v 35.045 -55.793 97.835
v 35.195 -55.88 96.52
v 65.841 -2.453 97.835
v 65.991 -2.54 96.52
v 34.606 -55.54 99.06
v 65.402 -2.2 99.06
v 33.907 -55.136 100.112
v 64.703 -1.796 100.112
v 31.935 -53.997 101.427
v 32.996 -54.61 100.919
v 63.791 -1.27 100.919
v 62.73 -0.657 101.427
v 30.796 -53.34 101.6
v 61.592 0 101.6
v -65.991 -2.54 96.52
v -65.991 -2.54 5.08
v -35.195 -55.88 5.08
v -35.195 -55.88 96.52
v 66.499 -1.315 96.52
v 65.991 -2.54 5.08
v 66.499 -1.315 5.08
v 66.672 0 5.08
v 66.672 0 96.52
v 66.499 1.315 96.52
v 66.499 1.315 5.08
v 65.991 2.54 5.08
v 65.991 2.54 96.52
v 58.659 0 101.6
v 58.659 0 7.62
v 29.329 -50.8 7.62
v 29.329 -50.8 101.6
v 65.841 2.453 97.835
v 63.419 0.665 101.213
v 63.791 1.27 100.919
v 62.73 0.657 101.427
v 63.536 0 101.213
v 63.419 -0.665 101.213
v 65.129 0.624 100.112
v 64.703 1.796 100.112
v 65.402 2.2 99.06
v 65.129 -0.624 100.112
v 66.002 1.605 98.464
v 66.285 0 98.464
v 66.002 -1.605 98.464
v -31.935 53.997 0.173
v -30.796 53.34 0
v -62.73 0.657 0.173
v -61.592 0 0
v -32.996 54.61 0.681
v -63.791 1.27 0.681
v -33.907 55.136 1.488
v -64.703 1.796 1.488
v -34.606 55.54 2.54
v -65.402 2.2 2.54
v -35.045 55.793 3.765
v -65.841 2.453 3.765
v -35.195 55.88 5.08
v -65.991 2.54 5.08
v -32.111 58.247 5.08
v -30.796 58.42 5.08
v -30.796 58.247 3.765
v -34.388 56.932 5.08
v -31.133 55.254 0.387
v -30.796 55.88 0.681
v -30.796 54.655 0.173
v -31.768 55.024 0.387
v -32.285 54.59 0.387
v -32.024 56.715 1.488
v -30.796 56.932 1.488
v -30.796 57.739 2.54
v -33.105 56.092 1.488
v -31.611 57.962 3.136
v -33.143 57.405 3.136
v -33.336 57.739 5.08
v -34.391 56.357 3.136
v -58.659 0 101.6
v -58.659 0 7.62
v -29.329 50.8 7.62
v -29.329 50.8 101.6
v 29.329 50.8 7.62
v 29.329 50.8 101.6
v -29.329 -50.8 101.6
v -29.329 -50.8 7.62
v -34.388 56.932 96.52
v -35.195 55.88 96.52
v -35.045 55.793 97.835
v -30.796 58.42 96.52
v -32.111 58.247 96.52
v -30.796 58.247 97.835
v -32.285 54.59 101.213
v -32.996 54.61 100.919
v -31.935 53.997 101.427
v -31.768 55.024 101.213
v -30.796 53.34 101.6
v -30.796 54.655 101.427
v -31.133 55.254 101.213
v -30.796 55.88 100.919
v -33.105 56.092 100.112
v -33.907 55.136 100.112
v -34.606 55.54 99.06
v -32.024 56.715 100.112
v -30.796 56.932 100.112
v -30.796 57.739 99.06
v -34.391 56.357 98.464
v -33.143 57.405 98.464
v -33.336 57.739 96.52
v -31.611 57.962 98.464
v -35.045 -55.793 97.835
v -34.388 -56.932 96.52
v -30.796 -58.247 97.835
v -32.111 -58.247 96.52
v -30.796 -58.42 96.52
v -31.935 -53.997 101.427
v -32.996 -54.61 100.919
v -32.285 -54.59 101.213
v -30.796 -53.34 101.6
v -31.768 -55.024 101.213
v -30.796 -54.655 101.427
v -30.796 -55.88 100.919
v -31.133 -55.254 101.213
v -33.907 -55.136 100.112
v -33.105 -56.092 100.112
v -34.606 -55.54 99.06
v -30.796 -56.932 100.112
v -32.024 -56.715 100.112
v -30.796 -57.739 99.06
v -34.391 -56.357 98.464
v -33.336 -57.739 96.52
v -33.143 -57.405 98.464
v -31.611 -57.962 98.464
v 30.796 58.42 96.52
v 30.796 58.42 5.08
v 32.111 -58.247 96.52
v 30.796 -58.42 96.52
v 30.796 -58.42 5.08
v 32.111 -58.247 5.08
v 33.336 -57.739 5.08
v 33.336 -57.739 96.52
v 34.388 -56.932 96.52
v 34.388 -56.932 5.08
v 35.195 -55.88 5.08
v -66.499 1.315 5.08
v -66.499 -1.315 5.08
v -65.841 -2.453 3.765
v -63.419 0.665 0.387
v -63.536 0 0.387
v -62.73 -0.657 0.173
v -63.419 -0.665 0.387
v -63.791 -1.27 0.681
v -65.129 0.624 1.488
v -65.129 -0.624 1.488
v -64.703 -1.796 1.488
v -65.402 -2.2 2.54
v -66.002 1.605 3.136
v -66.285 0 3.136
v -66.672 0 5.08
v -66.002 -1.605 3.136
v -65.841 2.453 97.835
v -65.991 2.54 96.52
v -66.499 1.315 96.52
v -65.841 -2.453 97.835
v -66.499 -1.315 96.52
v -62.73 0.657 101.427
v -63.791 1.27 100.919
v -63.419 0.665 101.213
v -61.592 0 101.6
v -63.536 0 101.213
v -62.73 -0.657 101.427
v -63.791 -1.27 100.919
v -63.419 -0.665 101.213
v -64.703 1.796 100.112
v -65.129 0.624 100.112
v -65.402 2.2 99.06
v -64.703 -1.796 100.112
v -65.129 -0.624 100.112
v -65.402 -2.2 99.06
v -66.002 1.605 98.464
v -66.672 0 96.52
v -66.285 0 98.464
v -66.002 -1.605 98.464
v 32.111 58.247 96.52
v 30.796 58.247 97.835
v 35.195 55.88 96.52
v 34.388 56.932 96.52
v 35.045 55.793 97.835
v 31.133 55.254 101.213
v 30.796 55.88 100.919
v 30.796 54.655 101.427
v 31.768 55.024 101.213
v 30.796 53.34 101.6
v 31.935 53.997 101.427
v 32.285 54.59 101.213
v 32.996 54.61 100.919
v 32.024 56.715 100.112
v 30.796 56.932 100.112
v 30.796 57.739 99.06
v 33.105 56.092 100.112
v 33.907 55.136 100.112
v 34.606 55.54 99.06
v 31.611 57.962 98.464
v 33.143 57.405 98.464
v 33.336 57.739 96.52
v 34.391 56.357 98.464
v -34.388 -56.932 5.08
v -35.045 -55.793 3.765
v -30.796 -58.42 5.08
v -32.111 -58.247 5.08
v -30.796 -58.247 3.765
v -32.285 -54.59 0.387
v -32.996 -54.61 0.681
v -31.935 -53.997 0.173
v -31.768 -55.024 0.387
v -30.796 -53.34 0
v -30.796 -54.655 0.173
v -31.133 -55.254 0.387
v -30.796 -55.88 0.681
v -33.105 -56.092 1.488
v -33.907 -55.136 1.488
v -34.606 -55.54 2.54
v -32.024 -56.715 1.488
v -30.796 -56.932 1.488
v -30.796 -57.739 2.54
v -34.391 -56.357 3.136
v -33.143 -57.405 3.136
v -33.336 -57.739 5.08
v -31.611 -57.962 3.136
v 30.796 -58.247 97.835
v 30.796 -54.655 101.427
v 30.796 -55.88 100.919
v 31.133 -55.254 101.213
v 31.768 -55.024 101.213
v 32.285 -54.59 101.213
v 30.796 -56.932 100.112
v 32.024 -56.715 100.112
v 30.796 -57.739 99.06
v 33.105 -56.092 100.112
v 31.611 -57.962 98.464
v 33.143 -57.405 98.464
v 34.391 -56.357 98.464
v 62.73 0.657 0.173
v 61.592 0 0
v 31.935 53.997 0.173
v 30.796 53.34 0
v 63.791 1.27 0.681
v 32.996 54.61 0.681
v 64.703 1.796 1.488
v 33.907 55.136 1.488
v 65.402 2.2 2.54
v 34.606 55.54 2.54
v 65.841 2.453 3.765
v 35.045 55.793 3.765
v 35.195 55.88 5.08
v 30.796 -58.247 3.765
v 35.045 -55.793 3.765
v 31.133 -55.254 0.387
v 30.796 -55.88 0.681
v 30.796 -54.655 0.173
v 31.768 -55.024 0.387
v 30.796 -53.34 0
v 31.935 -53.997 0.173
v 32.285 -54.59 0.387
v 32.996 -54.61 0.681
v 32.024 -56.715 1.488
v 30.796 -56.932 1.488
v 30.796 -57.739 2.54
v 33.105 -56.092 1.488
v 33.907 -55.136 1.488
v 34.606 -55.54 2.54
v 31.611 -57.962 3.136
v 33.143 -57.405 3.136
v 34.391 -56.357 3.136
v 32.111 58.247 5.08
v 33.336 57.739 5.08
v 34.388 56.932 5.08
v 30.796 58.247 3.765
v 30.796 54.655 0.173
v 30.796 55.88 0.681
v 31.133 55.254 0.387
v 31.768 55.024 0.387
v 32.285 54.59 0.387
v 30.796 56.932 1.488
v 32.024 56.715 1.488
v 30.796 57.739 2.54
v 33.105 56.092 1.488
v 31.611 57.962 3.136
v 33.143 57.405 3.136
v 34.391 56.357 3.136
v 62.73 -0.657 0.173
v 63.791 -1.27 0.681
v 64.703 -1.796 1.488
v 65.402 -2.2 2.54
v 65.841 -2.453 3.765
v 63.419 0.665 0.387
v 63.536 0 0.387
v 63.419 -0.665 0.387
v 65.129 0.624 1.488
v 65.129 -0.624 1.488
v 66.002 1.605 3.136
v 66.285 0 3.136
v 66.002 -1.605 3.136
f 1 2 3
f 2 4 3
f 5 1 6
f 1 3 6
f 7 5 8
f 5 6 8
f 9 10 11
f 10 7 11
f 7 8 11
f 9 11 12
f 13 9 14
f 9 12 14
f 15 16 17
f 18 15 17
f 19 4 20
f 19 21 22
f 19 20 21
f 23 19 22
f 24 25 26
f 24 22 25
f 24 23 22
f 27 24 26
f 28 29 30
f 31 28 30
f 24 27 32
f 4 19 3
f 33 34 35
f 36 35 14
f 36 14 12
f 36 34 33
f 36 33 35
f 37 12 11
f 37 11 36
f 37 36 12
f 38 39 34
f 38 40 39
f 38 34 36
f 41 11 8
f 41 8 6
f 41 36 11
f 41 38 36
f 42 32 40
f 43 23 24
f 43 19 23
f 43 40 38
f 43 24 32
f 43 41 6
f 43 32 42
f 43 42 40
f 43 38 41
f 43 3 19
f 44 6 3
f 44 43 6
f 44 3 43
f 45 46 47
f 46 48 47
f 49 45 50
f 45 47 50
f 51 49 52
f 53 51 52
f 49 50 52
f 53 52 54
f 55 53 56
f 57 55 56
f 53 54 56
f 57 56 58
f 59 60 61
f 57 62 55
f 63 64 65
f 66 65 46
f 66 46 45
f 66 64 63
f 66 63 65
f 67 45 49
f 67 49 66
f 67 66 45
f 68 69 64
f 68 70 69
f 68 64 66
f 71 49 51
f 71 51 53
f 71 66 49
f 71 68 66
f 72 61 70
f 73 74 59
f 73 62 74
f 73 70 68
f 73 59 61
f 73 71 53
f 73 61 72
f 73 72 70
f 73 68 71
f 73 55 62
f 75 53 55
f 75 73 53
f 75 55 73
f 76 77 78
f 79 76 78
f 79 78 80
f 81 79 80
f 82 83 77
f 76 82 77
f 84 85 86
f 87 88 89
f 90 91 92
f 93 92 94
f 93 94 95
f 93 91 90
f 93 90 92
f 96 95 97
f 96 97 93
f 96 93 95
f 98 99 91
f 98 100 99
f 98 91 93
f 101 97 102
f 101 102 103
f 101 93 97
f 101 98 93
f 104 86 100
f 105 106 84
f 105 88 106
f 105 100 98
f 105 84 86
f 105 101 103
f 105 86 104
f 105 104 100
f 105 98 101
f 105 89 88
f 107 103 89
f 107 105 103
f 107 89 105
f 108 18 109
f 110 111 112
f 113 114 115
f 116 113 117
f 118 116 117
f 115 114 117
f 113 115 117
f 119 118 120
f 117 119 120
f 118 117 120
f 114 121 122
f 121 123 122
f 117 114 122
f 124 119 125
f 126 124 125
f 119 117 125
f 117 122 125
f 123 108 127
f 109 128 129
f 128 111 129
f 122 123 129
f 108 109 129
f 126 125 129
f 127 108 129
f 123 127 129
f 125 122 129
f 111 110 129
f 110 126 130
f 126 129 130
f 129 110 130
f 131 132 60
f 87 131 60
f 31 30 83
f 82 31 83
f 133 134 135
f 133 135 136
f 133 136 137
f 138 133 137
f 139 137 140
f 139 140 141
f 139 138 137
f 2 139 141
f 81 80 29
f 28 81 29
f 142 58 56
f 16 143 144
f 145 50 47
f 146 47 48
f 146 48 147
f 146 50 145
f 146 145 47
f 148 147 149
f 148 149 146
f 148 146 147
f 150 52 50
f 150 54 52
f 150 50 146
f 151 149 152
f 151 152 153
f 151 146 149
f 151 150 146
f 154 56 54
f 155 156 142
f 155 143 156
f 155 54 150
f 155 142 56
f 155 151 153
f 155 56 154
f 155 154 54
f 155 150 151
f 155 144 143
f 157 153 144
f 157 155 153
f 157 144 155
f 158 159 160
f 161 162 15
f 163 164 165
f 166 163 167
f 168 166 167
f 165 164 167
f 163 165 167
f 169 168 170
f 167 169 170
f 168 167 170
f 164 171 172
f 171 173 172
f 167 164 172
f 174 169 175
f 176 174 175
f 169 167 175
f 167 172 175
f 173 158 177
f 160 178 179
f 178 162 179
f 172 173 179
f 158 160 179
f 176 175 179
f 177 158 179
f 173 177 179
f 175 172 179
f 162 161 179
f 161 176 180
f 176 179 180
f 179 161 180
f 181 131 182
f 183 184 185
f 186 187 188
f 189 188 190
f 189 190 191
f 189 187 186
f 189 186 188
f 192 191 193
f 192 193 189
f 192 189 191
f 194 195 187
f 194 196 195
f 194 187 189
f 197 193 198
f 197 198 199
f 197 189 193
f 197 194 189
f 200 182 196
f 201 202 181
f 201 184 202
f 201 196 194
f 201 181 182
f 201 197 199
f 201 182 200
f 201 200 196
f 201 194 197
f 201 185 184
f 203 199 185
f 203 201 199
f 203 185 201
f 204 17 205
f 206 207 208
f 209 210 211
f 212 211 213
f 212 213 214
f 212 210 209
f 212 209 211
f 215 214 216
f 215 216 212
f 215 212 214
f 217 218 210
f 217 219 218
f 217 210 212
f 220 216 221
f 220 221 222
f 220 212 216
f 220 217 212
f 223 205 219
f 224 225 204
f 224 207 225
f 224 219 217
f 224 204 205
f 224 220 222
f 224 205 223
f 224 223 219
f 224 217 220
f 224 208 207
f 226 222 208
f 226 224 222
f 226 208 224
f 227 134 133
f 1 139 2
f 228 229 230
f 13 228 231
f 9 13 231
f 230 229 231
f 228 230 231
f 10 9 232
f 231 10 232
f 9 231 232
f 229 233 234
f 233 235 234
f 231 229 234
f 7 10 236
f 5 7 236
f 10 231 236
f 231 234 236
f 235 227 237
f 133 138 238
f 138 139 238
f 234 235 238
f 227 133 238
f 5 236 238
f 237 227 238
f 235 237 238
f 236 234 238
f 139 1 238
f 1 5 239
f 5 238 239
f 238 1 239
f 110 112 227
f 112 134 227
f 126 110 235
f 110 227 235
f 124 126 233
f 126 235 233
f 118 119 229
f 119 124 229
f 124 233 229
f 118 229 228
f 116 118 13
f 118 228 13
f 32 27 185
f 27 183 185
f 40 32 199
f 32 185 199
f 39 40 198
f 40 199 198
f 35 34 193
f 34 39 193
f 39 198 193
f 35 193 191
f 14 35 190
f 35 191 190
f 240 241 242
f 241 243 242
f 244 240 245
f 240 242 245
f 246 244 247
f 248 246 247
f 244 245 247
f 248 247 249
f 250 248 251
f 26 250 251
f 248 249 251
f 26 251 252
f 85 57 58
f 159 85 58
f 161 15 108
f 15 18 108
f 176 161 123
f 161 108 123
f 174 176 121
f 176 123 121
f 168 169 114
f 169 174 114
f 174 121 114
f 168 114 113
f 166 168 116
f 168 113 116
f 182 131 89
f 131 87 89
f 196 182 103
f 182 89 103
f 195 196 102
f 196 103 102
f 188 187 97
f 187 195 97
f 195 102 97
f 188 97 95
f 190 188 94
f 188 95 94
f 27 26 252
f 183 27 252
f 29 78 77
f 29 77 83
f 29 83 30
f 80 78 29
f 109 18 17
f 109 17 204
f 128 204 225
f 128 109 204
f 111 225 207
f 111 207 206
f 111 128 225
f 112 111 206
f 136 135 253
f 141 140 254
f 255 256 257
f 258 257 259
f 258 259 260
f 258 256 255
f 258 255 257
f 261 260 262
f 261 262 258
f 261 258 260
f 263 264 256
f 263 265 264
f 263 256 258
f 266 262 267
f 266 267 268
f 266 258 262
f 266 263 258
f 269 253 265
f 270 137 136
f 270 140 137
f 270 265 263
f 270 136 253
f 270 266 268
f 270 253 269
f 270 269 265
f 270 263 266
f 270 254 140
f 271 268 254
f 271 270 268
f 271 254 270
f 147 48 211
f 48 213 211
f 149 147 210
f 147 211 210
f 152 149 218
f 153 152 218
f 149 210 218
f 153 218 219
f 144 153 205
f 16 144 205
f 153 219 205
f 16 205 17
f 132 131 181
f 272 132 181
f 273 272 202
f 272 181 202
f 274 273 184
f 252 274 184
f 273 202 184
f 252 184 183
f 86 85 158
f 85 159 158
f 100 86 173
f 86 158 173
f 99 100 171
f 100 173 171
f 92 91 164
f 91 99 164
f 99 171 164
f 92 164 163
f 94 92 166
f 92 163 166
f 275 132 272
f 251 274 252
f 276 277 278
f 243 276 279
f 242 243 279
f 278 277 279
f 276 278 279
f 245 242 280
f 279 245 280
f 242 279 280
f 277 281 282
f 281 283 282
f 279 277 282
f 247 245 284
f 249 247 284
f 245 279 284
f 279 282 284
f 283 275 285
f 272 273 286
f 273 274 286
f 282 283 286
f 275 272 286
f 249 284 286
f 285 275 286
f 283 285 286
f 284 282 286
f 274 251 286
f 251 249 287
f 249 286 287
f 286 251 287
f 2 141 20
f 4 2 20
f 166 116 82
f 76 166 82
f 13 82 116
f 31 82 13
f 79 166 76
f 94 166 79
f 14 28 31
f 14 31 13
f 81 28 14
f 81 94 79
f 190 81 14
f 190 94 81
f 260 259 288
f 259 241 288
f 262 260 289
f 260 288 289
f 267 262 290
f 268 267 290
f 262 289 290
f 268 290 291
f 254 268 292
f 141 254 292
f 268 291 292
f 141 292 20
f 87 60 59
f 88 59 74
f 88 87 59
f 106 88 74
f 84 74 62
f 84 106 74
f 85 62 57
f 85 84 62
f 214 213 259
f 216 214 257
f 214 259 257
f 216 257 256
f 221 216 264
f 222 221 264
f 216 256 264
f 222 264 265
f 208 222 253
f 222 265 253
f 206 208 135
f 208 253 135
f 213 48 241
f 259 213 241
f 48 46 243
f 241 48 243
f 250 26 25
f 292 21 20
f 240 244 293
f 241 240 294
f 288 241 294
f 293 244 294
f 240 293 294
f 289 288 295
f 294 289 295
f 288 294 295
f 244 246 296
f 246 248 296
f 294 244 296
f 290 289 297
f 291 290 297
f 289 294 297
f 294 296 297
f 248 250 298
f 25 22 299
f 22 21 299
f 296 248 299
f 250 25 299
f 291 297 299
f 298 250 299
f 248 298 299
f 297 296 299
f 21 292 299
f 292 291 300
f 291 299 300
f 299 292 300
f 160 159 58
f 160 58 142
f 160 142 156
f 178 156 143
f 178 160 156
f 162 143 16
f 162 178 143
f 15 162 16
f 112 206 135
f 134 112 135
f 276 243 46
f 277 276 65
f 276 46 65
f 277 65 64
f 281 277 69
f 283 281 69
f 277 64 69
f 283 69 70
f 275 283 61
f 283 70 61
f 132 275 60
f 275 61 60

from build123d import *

# Parameters (mm, degrees)
F1_DEPTH = 101.6
F2_DEPTH = 7.62
F3_R     = 5.08


with BuildPart() as f1:
    # F0 (on Top) → F1 (new body)
    with BuildSketch(Plane.XY):
        Polygon((33.728803, 58.42), (0, 58.42), (-33.728803, 58.42), (-67.457605, 0), (-33.728803, -58.42), (33.728803, -58.42), (67.457605, 0), align=None)
        Polygon((-58.658787, 0), (-29.329394, 50.8), (0, 50.8), (29.329394, 50.8), (58.658787, 0), (29.329394, -50.8), (-29.329394, -50.8), align=None, mode=Mode.SUBTRACT)
    extrude(amount=F1_DEPTH)

    # F0 (on Top) → F2 (join)
    with BuildSketch(Plane.XY):
        Polygon((0, 50.8), (-29.329394, 50.8), (-58.658787, 0), (-29.329394, -50.8), (29.329394, -50.8), (58.658787, 0), (29.329394, 50.8), align=None)
    extrude(amount=F2_DEPTH)

    # F3
    f3_edges = [f1.edges().sort_by_distance(p)[0] for p in [
        (33.728803, 58.42, 50.8),
        (0, 58.42, 101.6),
        (-33.728803, 58.42, 50.8),
        (0, 58.42, 0),
        (-67.457605, 0, 50.8),
        (-50.593204, 29.21, 0),
        (-50.593204, 29.21, 101.6),
        (-33.728803, -58.42, 50.8),
        (-50.593204, -29.21, 0),
        (-50.593204, -29.21, 101.6),
        (33.728803, -58.42, 50.8),
        (0, -58.42, 0),
        (0, -58.42, 101.6),
        (67.457605, 0, 50.8),
        (50.593204, 29.21, 0),
        (50.593204, 29.21, 101.6),
        (50.593204, -29.21, 0),
        (50.593204, -29.21, 101.6),
    ]]
    fillet(f3_edges, radius=F3_R)


solid = f1.part
